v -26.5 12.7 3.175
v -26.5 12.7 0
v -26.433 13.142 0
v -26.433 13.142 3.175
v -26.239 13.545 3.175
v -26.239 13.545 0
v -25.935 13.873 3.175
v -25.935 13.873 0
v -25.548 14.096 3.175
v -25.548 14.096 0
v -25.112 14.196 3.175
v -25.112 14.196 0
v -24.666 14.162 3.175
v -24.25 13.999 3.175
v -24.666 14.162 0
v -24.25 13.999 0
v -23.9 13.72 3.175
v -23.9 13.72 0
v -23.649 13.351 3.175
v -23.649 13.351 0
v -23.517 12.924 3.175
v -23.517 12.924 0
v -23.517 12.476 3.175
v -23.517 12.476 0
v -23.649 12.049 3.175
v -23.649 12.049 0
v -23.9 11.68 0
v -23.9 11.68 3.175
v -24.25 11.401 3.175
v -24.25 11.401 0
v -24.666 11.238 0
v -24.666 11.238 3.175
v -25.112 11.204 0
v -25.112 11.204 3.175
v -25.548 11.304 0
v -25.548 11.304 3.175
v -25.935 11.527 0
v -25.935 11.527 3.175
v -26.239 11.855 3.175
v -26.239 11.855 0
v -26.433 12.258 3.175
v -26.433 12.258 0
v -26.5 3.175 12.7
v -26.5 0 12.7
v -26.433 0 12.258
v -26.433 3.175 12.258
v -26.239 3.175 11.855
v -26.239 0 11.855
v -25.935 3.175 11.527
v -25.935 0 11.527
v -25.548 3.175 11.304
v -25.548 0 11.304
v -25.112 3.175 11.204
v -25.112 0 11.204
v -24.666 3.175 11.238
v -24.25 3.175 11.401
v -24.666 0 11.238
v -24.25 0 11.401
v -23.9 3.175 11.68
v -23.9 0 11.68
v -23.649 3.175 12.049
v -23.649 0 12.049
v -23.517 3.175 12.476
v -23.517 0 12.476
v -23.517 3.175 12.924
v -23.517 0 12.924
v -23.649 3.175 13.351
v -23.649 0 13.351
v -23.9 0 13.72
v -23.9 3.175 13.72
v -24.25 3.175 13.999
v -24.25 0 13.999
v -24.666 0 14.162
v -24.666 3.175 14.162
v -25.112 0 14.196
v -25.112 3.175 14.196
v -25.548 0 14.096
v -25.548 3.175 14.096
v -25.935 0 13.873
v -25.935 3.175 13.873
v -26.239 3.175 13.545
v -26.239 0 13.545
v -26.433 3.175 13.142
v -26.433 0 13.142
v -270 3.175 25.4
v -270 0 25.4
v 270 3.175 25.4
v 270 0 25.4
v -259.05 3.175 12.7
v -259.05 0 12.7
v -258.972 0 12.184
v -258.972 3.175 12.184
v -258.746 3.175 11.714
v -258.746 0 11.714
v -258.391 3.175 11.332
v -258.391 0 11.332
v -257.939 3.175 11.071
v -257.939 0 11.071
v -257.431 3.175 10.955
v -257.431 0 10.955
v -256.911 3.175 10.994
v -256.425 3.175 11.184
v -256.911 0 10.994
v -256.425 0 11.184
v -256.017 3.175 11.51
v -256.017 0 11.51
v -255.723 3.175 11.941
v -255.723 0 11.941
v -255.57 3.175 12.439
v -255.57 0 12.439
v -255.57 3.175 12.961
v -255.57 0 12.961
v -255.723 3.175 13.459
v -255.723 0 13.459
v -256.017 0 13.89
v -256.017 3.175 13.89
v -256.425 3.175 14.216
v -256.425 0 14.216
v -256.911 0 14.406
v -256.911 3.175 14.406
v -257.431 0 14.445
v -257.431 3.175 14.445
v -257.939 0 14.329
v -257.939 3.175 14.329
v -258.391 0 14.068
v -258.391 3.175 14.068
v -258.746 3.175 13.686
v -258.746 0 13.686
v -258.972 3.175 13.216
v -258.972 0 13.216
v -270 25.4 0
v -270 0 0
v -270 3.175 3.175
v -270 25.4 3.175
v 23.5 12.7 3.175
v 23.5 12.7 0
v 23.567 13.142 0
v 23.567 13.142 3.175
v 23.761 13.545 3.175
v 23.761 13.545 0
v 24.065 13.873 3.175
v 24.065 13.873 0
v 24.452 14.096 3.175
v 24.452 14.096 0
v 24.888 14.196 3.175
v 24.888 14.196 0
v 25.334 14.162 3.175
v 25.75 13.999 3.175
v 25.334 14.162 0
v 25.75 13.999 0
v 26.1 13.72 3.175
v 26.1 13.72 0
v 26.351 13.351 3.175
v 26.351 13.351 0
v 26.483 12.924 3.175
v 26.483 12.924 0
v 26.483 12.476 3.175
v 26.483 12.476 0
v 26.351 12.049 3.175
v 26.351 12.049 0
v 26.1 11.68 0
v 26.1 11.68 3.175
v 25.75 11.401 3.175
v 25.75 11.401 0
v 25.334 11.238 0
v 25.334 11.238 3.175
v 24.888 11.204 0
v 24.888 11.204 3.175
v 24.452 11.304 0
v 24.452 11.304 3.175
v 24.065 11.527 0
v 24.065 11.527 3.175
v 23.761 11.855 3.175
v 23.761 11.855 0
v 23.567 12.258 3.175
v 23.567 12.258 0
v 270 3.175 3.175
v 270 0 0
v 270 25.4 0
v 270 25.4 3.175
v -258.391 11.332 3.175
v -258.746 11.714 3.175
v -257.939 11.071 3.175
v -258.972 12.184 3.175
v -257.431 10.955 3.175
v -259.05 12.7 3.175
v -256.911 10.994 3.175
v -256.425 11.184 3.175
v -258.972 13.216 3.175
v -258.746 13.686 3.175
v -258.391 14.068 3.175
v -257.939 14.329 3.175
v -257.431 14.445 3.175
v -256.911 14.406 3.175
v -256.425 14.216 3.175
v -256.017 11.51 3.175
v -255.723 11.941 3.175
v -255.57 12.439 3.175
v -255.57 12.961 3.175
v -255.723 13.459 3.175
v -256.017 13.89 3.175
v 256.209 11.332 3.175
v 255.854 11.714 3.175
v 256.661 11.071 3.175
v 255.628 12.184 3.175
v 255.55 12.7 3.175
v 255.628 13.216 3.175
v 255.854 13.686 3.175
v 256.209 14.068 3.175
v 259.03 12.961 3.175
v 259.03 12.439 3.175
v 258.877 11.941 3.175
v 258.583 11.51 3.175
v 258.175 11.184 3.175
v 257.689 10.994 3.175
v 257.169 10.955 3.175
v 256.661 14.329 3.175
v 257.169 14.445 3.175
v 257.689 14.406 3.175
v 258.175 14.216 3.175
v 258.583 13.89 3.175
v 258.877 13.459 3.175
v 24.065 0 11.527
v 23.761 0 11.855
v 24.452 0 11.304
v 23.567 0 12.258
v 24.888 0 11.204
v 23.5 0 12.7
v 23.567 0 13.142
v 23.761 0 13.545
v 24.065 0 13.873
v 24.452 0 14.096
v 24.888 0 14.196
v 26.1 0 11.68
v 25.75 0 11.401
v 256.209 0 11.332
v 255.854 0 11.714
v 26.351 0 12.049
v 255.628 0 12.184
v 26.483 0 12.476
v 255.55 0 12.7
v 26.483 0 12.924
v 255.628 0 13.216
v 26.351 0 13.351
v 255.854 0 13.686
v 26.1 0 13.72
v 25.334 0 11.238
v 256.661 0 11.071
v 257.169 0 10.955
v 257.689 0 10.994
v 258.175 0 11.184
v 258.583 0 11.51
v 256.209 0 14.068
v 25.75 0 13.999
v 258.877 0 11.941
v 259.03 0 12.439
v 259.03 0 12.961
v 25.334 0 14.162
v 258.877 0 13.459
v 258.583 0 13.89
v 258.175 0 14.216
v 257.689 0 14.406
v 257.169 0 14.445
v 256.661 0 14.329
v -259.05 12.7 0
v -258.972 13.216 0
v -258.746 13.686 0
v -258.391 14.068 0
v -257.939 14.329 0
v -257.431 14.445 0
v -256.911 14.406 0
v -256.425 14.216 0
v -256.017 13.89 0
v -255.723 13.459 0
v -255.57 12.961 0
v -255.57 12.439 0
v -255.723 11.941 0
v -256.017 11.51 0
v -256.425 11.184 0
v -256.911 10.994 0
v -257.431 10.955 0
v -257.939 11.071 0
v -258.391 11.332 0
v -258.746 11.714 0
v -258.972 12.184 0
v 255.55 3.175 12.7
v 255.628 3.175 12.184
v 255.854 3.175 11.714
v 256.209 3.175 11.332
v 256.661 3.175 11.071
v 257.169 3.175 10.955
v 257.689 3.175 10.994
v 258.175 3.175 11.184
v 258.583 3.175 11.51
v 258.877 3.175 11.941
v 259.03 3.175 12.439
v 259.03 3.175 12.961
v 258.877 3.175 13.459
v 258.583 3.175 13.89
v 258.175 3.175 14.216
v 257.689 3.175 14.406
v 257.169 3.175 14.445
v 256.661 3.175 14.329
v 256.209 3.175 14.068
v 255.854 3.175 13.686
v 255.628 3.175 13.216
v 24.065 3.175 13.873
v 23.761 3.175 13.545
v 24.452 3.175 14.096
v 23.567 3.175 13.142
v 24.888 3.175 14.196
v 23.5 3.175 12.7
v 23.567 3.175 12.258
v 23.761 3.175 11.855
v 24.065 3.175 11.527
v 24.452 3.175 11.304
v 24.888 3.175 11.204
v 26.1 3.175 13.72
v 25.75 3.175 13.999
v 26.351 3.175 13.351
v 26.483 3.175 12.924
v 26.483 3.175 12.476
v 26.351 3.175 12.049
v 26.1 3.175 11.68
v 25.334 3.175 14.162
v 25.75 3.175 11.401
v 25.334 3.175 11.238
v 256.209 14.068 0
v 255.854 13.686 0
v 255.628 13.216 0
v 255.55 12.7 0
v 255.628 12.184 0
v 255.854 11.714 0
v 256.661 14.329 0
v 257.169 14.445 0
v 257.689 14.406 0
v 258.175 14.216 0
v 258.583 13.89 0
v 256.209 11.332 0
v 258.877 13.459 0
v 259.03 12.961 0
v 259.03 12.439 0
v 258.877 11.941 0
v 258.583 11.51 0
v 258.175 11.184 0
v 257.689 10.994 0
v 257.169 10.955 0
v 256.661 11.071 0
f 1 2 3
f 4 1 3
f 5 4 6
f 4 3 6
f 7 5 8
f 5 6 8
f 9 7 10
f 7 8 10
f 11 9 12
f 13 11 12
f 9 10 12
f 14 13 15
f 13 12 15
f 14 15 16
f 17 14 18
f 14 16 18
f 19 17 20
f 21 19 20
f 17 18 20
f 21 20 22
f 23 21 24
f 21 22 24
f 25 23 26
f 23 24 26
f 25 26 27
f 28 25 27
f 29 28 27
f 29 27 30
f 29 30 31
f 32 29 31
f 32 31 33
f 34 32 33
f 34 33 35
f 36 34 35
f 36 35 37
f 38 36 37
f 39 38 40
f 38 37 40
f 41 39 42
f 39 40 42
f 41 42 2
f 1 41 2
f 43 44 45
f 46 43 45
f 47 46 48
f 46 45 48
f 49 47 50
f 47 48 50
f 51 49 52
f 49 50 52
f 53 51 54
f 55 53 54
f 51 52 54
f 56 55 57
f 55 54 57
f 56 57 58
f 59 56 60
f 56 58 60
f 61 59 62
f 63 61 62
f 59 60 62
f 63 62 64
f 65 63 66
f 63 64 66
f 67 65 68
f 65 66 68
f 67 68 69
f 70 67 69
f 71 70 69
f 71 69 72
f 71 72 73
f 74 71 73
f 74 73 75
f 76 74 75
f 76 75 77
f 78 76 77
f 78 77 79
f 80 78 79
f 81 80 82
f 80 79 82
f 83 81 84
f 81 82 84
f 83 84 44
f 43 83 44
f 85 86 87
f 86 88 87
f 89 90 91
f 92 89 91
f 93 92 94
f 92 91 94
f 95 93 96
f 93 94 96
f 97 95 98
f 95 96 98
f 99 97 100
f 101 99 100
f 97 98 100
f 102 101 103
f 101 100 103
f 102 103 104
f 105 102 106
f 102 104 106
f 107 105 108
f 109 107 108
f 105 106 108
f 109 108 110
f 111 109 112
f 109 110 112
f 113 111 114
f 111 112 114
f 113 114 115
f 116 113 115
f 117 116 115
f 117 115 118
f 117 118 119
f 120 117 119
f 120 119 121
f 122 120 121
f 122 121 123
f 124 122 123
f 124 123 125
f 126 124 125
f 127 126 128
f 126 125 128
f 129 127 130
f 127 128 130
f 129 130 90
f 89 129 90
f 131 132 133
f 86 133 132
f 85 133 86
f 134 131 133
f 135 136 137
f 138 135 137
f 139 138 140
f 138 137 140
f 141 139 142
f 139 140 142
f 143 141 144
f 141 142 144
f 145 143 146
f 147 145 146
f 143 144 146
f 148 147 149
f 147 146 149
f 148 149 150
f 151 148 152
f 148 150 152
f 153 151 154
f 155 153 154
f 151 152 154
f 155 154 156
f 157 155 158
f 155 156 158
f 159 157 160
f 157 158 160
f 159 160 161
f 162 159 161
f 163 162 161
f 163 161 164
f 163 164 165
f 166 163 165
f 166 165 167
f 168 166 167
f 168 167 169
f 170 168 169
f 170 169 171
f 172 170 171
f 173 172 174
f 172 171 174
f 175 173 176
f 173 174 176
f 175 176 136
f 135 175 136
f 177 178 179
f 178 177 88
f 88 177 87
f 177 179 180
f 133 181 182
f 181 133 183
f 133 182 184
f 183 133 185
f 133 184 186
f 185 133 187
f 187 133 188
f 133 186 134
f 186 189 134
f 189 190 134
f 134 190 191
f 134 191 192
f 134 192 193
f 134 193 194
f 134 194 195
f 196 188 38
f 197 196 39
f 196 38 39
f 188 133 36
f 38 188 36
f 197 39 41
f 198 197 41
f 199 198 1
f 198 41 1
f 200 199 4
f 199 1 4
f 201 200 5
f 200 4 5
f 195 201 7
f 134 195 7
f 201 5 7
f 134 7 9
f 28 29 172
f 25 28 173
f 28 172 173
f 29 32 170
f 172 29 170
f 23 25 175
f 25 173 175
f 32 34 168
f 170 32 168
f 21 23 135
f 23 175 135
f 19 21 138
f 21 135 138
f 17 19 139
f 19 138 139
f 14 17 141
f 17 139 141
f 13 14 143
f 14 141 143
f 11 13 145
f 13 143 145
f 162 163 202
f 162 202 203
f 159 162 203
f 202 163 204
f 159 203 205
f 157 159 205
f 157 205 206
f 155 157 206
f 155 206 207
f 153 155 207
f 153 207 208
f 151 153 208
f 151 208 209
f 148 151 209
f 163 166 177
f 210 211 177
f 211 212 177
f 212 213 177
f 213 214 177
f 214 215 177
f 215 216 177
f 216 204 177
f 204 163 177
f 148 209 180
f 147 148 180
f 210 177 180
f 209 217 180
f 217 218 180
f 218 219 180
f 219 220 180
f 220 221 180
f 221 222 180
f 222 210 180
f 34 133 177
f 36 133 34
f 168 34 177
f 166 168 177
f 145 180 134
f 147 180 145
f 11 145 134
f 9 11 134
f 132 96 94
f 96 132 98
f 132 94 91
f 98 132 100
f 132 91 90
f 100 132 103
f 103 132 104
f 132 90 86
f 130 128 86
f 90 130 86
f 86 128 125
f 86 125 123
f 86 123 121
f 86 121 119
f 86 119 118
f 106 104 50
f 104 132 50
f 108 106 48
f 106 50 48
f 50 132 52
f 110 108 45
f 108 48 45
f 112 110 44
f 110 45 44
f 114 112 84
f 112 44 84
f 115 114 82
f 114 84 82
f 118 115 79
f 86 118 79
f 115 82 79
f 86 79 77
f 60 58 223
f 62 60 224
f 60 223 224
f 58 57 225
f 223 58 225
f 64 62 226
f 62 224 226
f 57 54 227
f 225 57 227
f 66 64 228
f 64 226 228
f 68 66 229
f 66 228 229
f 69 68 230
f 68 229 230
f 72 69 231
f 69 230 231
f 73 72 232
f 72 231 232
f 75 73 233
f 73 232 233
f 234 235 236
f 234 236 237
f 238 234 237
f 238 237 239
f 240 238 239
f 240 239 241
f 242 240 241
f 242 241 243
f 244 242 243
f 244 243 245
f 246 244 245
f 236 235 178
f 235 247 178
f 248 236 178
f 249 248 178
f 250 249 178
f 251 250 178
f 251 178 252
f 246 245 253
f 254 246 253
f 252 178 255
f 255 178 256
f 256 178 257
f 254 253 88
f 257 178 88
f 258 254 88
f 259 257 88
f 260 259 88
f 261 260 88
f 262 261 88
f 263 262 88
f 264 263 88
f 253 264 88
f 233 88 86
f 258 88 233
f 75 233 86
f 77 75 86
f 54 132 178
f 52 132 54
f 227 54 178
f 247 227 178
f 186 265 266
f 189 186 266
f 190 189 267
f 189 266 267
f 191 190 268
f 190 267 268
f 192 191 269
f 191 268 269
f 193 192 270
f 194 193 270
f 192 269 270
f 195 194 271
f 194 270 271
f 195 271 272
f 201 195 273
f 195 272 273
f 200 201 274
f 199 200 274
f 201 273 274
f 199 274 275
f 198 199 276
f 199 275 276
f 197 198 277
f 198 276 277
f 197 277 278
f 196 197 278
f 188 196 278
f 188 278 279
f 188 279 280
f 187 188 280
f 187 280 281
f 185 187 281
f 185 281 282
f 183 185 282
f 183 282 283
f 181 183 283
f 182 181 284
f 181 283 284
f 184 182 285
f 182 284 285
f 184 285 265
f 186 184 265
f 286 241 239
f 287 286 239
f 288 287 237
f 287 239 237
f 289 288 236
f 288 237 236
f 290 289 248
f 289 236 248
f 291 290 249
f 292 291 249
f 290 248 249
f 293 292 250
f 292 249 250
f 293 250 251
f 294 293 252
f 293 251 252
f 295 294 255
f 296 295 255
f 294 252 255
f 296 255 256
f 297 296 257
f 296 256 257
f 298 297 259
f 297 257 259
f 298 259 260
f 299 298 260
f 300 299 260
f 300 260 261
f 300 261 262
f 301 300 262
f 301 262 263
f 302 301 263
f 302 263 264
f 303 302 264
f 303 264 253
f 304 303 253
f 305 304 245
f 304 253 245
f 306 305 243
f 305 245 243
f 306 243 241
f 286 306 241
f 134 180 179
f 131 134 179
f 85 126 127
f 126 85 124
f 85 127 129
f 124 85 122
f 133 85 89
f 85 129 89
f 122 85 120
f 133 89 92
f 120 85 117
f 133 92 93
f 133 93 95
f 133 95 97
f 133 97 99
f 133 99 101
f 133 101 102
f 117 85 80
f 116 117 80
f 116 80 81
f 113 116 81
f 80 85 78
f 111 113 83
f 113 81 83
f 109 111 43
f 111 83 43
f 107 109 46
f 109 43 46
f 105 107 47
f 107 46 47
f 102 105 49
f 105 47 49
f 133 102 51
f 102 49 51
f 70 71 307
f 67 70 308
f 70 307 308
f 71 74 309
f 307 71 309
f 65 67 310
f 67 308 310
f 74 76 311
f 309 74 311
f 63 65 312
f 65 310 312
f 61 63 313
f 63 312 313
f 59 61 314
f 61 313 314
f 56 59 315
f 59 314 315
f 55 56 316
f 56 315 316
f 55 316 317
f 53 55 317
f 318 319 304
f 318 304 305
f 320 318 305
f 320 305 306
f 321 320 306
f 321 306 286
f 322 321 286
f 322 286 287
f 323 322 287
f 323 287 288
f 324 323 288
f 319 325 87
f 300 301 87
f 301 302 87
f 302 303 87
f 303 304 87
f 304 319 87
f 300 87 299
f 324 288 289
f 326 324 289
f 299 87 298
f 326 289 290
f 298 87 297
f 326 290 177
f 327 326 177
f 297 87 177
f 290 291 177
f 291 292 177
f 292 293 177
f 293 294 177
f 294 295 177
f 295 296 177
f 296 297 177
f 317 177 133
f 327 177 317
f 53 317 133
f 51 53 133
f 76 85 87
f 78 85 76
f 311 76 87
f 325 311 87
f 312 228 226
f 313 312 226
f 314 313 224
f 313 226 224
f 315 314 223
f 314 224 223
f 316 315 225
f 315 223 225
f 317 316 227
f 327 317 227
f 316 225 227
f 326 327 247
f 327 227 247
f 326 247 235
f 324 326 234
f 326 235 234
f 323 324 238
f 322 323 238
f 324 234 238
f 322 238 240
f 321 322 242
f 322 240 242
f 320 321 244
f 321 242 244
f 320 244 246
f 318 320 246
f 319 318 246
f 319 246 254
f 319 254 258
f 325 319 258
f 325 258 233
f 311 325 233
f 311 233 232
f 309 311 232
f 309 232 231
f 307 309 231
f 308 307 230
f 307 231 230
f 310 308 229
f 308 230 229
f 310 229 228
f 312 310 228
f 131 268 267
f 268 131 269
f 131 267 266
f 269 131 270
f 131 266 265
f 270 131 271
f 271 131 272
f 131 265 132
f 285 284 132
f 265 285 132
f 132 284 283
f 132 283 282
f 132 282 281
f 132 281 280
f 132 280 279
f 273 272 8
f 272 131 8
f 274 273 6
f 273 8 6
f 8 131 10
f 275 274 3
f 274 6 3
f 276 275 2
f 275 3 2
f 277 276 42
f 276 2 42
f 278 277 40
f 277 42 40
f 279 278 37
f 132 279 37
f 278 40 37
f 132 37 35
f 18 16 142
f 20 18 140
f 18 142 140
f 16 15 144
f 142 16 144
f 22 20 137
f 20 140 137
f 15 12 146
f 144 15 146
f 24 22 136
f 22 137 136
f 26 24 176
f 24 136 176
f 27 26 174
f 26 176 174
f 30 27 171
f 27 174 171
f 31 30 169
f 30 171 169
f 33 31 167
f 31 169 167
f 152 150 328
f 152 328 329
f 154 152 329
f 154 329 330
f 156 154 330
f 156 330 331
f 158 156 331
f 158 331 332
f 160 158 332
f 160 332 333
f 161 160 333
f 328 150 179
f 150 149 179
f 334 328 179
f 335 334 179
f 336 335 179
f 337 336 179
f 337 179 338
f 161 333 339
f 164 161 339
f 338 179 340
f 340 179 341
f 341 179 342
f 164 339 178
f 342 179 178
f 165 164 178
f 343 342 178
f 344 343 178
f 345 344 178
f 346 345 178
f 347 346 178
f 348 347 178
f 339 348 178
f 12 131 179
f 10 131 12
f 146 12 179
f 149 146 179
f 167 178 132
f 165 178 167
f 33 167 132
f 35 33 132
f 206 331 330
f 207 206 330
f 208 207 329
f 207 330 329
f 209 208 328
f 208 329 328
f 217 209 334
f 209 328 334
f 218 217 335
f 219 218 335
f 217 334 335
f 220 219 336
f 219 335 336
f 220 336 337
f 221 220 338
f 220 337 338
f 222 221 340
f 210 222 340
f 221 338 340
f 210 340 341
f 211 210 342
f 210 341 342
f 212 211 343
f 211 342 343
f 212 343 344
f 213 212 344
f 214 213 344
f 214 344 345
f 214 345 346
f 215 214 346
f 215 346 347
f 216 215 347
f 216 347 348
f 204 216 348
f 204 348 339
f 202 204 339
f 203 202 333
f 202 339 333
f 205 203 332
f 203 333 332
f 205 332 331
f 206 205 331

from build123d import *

# Parameters (mm, degrees)
SALIENTE_EXTRUIR1_DEPTH      = 270
SALIENTE_EXTRUIR1_DEPTH_BACK = 270
CROQUIS3_R                   = 1.5
CROQUIS3_R_2                 = 1.75
CORTAR_EXTRUIR1_DEPTH        = 3.175
CROQUIS4_R                   = 1.5
CROQUIS4_R_2                 = 1.75
CORTAR_EXTRUIR2_DEPTH        = 3.175


with BuildPart() as part:
    # Croquis1 → Saliente-Extruir1 (new body, two sides)
    with BuildSketch(Plane(origin=(0, 0, 0), x_dir=(0, 0, -1), z_dir=(1, 0, 0))) as saliente_extruir1_sk:
        Polygon((0, 25.4), (0, 0), (-25.4, 0), (-25.4, 3.175), (-3.175, 3.175), (-3.175, 25.4), align=None)
    extrude(amount=SALIENTE_EXTRUIR1_DEPTH)
    extrude(saliente_extruir1_sk.sketch, amount=-SALIENTE_EXTRUIR1_DEPTH_BACK)

    # Croquis3 → Cortar-Extruir1 (cut)
    with BuildSketch(Plane(origin=(0, 0, 0), x_dir=(-1, 0, 0), z_dir=(0, -1, 0))):
        with Locations((-25, -12.7)):
            Circle(CROQUIS3_R)
        with Locations((25, -12.7)):
            Circle(CROQUIS3_R)
        with Locations((-257.3, -12.7)):
            Circle(CROQUIS3_R_2)
        with Locations((257.3, -12.7)):
            Circle(CROQUIS3_R_2)
    extrude(amount=-CORTAR_EXTRUIR1_DEPTH, mode=Mode.SUBTRACT)

    # Croquis4 → Cortar-Extruir2 (cut)
    with BuildSketch(Plane(origin=(0, 0, 0), x_dir=(-1, 0, 0), z_dir=(0, 0, -1))):
        with Locations((25, 12.7)):
            Circle(CROQUIS4_R)
        with Locations((-25, 12.7)):
            Circle(CROQUIS4_R)
        with Locations((-257.3, 12.7)):
            Circle(CROQUIS4_R_2)
        with Locations((257.3, 12.7)):
            Circle(CROQUIS4_R_2)
    extrude(amount=-CORTAR_EXTRUIR2_DEPTH, mode=Mode.SUBTRACT)


solid = part.part
